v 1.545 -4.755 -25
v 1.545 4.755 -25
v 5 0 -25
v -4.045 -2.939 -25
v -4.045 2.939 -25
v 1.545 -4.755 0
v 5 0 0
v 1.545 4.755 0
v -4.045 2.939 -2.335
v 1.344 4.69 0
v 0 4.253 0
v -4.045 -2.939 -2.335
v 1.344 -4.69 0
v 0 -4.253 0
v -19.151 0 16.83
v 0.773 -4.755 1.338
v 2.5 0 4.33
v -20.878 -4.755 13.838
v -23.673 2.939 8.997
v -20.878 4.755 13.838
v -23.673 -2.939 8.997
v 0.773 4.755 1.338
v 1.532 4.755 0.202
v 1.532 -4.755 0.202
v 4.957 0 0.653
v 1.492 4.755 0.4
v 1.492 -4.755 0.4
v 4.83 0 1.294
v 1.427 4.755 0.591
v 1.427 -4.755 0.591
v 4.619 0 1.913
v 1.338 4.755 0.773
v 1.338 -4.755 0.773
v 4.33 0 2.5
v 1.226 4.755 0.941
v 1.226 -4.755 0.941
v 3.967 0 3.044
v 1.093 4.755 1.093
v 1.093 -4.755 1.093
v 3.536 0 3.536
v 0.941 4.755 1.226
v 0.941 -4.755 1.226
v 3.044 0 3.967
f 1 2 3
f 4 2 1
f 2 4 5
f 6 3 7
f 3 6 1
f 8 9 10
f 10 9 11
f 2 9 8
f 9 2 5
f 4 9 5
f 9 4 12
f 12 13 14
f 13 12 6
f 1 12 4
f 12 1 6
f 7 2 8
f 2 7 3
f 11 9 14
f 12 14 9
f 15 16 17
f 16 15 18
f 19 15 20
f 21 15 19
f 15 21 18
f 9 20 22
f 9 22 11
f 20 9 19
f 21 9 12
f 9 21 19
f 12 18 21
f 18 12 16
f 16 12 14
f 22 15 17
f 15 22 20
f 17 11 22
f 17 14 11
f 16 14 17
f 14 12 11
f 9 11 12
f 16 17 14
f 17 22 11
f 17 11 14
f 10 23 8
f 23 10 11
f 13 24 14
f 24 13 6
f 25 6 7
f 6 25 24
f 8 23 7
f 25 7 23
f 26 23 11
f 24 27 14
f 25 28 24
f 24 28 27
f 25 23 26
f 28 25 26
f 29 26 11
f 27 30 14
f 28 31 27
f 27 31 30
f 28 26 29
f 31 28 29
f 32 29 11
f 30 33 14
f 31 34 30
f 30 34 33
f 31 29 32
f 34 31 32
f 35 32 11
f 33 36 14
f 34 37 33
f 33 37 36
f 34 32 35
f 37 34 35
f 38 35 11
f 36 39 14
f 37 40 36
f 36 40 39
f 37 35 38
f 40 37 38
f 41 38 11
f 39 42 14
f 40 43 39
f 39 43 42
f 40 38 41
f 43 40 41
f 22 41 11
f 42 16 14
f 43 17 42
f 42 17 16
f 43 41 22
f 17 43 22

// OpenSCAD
// file: BendingLib.scad
_big_value=1000;

module bend(Angle) {
    angle=Angle%180;
    bendStart(angle) children(0);
    bendStart(angle) children(0);
    bentPart(angle) children(0);
    bendEnd(angle) children(0);
}

module bentPart(angle) {
    signe=angle>0?1:-1;
    rotate([90, 0, 0])
        rotate_extrude(angle = angle)
            difference() {
                projection()
                    children(0);
                translate([-signe * _big_value / 2, 0])
                    square(_big_value, center = true);
            }
}

module bentPart_old(angle) {
    signe=angle>0?1:-1;
    rotate([90, 0, 0])
        rotate_extrude(angle = angle)
            difference() {
                projection()
                    children(0);
                translate([-signe * _big_value / 2, 0])
                    square(_big_value, center = true);
            }
}

module bendStart(angle) {
    difference() {
        children(0);
        translate([0,0,_big_value/2]) cube(_big_value, center=true);
        rotate([0,-angle/2,0]) translate([0,0,_big_value/2]) cube(_big_value, center=true);
    }
}

module bendEnd(angle) {
    rotate([0,-angle,0])
    difference() {
        children(0);
        translate([0,0,-_big_value/2]) cube(_big_value, center=true);
        rotate([0,angle/2,0]) translate([0,0,-_big_value/2]) cube(_big_value, center=true);
    }
}
// main file
include <BendingLib.scad>

angle=60;
$fn=50;

bend(angle)
    pen5();

module pentagon(r) {
    circle(r=r, $fn=5);
}

module pen5() {
            linear_extrude(50, center=true)
                pentagon(r=5);
}
